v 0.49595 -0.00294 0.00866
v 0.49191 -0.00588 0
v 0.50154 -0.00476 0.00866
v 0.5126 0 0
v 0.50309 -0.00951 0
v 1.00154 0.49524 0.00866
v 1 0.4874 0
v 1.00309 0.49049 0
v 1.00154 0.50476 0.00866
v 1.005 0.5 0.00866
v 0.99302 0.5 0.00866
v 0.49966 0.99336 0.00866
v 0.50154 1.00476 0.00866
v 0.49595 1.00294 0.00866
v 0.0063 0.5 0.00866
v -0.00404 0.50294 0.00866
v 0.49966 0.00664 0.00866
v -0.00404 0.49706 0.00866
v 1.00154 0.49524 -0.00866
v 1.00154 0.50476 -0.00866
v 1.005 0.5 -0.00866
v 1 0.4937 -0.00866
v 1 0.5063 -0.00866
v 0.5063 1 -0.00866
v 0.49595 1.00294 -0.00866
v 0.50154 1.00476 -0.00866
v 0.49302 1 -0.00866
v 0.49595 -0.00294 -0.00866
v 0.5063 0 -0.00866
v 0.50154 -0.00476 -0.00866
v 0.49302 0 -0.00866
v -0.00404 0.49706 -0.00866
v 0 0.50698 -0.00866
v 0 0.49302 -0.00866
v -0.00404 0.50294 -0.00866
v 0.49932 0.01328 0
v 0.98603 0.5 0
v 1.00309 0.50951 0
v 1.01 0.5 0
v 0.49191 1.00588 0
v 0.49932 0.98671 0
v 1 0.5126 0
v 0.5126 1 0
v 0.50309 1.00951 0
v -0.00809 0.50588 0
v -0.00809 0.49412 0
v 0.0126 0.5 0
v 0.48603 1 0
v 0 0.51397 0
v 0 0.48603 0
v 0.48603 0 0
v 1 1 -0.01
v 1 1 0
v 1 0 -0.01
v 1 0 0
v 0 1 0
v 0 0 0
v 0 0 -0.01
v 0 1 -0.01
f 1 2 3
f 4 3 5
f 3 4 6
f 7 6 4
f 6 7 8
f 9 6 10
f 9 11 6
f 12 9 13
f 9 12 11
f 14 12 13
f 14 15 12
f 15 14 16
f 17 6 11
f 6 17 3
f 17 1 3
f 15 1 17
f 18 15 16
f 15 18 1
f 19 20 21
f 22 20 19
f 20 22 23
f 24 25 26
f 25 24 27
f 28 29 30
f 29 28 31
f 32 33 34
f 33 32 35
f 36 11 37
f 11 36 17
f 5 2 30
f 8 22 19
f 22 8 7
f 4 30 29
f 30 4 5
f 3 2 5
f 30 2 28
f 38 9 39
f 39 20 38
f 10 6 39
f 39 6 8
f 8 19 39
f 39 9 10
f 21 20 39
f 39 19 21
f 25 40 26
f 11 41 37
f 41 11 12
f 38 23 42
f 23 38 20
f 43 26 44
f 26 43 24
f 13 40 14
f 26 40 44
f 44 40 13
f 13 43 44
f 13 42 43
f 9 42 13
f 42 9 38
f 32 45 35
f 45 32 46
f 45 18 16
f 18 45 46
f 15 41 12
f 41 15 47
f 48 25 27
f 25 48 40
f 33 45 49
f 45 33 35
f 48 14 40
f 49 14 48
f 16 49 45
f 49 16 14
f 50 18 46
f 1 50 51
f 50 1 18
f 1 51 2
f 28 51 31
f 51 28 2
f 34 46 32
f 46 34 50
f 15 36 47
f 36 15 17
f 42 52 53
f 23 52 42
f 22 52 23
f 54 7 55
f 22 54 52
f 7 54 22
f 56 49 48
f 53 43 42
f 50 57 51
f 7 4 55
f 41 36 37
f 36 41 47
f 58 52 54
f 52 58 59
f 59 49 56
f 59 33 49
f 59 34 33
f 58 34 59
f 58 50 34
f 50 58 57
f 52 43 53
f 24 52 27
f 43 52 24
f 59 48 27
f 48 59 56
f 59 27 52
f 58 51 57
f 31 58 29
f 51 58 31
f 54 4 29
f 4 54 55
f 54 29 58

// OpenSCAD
hull(){
    translate([0.5, 0.0]) sphere(0.01);
    translate([1.0, 0.5]) sphere(0.01);
}
hull(){
    translate([1.0, 0.5]) sphere(0.01);
    translate([0.5, 1.0]) sphere(0.01);
}
hull(){
    translate([0.5, 1.0]) sphere(0.01);
    translate([0.0, 0.5]) sphere(0.01);
}
hull(){
    translate([0.0, 0.5]) sphere(0.01);
    translate([0.5, 0.0]) sphere(0.01);
}
translate([0,0,-0.01]) color([0.1,0.1,0.1]) cube([1,1,0.01]);
